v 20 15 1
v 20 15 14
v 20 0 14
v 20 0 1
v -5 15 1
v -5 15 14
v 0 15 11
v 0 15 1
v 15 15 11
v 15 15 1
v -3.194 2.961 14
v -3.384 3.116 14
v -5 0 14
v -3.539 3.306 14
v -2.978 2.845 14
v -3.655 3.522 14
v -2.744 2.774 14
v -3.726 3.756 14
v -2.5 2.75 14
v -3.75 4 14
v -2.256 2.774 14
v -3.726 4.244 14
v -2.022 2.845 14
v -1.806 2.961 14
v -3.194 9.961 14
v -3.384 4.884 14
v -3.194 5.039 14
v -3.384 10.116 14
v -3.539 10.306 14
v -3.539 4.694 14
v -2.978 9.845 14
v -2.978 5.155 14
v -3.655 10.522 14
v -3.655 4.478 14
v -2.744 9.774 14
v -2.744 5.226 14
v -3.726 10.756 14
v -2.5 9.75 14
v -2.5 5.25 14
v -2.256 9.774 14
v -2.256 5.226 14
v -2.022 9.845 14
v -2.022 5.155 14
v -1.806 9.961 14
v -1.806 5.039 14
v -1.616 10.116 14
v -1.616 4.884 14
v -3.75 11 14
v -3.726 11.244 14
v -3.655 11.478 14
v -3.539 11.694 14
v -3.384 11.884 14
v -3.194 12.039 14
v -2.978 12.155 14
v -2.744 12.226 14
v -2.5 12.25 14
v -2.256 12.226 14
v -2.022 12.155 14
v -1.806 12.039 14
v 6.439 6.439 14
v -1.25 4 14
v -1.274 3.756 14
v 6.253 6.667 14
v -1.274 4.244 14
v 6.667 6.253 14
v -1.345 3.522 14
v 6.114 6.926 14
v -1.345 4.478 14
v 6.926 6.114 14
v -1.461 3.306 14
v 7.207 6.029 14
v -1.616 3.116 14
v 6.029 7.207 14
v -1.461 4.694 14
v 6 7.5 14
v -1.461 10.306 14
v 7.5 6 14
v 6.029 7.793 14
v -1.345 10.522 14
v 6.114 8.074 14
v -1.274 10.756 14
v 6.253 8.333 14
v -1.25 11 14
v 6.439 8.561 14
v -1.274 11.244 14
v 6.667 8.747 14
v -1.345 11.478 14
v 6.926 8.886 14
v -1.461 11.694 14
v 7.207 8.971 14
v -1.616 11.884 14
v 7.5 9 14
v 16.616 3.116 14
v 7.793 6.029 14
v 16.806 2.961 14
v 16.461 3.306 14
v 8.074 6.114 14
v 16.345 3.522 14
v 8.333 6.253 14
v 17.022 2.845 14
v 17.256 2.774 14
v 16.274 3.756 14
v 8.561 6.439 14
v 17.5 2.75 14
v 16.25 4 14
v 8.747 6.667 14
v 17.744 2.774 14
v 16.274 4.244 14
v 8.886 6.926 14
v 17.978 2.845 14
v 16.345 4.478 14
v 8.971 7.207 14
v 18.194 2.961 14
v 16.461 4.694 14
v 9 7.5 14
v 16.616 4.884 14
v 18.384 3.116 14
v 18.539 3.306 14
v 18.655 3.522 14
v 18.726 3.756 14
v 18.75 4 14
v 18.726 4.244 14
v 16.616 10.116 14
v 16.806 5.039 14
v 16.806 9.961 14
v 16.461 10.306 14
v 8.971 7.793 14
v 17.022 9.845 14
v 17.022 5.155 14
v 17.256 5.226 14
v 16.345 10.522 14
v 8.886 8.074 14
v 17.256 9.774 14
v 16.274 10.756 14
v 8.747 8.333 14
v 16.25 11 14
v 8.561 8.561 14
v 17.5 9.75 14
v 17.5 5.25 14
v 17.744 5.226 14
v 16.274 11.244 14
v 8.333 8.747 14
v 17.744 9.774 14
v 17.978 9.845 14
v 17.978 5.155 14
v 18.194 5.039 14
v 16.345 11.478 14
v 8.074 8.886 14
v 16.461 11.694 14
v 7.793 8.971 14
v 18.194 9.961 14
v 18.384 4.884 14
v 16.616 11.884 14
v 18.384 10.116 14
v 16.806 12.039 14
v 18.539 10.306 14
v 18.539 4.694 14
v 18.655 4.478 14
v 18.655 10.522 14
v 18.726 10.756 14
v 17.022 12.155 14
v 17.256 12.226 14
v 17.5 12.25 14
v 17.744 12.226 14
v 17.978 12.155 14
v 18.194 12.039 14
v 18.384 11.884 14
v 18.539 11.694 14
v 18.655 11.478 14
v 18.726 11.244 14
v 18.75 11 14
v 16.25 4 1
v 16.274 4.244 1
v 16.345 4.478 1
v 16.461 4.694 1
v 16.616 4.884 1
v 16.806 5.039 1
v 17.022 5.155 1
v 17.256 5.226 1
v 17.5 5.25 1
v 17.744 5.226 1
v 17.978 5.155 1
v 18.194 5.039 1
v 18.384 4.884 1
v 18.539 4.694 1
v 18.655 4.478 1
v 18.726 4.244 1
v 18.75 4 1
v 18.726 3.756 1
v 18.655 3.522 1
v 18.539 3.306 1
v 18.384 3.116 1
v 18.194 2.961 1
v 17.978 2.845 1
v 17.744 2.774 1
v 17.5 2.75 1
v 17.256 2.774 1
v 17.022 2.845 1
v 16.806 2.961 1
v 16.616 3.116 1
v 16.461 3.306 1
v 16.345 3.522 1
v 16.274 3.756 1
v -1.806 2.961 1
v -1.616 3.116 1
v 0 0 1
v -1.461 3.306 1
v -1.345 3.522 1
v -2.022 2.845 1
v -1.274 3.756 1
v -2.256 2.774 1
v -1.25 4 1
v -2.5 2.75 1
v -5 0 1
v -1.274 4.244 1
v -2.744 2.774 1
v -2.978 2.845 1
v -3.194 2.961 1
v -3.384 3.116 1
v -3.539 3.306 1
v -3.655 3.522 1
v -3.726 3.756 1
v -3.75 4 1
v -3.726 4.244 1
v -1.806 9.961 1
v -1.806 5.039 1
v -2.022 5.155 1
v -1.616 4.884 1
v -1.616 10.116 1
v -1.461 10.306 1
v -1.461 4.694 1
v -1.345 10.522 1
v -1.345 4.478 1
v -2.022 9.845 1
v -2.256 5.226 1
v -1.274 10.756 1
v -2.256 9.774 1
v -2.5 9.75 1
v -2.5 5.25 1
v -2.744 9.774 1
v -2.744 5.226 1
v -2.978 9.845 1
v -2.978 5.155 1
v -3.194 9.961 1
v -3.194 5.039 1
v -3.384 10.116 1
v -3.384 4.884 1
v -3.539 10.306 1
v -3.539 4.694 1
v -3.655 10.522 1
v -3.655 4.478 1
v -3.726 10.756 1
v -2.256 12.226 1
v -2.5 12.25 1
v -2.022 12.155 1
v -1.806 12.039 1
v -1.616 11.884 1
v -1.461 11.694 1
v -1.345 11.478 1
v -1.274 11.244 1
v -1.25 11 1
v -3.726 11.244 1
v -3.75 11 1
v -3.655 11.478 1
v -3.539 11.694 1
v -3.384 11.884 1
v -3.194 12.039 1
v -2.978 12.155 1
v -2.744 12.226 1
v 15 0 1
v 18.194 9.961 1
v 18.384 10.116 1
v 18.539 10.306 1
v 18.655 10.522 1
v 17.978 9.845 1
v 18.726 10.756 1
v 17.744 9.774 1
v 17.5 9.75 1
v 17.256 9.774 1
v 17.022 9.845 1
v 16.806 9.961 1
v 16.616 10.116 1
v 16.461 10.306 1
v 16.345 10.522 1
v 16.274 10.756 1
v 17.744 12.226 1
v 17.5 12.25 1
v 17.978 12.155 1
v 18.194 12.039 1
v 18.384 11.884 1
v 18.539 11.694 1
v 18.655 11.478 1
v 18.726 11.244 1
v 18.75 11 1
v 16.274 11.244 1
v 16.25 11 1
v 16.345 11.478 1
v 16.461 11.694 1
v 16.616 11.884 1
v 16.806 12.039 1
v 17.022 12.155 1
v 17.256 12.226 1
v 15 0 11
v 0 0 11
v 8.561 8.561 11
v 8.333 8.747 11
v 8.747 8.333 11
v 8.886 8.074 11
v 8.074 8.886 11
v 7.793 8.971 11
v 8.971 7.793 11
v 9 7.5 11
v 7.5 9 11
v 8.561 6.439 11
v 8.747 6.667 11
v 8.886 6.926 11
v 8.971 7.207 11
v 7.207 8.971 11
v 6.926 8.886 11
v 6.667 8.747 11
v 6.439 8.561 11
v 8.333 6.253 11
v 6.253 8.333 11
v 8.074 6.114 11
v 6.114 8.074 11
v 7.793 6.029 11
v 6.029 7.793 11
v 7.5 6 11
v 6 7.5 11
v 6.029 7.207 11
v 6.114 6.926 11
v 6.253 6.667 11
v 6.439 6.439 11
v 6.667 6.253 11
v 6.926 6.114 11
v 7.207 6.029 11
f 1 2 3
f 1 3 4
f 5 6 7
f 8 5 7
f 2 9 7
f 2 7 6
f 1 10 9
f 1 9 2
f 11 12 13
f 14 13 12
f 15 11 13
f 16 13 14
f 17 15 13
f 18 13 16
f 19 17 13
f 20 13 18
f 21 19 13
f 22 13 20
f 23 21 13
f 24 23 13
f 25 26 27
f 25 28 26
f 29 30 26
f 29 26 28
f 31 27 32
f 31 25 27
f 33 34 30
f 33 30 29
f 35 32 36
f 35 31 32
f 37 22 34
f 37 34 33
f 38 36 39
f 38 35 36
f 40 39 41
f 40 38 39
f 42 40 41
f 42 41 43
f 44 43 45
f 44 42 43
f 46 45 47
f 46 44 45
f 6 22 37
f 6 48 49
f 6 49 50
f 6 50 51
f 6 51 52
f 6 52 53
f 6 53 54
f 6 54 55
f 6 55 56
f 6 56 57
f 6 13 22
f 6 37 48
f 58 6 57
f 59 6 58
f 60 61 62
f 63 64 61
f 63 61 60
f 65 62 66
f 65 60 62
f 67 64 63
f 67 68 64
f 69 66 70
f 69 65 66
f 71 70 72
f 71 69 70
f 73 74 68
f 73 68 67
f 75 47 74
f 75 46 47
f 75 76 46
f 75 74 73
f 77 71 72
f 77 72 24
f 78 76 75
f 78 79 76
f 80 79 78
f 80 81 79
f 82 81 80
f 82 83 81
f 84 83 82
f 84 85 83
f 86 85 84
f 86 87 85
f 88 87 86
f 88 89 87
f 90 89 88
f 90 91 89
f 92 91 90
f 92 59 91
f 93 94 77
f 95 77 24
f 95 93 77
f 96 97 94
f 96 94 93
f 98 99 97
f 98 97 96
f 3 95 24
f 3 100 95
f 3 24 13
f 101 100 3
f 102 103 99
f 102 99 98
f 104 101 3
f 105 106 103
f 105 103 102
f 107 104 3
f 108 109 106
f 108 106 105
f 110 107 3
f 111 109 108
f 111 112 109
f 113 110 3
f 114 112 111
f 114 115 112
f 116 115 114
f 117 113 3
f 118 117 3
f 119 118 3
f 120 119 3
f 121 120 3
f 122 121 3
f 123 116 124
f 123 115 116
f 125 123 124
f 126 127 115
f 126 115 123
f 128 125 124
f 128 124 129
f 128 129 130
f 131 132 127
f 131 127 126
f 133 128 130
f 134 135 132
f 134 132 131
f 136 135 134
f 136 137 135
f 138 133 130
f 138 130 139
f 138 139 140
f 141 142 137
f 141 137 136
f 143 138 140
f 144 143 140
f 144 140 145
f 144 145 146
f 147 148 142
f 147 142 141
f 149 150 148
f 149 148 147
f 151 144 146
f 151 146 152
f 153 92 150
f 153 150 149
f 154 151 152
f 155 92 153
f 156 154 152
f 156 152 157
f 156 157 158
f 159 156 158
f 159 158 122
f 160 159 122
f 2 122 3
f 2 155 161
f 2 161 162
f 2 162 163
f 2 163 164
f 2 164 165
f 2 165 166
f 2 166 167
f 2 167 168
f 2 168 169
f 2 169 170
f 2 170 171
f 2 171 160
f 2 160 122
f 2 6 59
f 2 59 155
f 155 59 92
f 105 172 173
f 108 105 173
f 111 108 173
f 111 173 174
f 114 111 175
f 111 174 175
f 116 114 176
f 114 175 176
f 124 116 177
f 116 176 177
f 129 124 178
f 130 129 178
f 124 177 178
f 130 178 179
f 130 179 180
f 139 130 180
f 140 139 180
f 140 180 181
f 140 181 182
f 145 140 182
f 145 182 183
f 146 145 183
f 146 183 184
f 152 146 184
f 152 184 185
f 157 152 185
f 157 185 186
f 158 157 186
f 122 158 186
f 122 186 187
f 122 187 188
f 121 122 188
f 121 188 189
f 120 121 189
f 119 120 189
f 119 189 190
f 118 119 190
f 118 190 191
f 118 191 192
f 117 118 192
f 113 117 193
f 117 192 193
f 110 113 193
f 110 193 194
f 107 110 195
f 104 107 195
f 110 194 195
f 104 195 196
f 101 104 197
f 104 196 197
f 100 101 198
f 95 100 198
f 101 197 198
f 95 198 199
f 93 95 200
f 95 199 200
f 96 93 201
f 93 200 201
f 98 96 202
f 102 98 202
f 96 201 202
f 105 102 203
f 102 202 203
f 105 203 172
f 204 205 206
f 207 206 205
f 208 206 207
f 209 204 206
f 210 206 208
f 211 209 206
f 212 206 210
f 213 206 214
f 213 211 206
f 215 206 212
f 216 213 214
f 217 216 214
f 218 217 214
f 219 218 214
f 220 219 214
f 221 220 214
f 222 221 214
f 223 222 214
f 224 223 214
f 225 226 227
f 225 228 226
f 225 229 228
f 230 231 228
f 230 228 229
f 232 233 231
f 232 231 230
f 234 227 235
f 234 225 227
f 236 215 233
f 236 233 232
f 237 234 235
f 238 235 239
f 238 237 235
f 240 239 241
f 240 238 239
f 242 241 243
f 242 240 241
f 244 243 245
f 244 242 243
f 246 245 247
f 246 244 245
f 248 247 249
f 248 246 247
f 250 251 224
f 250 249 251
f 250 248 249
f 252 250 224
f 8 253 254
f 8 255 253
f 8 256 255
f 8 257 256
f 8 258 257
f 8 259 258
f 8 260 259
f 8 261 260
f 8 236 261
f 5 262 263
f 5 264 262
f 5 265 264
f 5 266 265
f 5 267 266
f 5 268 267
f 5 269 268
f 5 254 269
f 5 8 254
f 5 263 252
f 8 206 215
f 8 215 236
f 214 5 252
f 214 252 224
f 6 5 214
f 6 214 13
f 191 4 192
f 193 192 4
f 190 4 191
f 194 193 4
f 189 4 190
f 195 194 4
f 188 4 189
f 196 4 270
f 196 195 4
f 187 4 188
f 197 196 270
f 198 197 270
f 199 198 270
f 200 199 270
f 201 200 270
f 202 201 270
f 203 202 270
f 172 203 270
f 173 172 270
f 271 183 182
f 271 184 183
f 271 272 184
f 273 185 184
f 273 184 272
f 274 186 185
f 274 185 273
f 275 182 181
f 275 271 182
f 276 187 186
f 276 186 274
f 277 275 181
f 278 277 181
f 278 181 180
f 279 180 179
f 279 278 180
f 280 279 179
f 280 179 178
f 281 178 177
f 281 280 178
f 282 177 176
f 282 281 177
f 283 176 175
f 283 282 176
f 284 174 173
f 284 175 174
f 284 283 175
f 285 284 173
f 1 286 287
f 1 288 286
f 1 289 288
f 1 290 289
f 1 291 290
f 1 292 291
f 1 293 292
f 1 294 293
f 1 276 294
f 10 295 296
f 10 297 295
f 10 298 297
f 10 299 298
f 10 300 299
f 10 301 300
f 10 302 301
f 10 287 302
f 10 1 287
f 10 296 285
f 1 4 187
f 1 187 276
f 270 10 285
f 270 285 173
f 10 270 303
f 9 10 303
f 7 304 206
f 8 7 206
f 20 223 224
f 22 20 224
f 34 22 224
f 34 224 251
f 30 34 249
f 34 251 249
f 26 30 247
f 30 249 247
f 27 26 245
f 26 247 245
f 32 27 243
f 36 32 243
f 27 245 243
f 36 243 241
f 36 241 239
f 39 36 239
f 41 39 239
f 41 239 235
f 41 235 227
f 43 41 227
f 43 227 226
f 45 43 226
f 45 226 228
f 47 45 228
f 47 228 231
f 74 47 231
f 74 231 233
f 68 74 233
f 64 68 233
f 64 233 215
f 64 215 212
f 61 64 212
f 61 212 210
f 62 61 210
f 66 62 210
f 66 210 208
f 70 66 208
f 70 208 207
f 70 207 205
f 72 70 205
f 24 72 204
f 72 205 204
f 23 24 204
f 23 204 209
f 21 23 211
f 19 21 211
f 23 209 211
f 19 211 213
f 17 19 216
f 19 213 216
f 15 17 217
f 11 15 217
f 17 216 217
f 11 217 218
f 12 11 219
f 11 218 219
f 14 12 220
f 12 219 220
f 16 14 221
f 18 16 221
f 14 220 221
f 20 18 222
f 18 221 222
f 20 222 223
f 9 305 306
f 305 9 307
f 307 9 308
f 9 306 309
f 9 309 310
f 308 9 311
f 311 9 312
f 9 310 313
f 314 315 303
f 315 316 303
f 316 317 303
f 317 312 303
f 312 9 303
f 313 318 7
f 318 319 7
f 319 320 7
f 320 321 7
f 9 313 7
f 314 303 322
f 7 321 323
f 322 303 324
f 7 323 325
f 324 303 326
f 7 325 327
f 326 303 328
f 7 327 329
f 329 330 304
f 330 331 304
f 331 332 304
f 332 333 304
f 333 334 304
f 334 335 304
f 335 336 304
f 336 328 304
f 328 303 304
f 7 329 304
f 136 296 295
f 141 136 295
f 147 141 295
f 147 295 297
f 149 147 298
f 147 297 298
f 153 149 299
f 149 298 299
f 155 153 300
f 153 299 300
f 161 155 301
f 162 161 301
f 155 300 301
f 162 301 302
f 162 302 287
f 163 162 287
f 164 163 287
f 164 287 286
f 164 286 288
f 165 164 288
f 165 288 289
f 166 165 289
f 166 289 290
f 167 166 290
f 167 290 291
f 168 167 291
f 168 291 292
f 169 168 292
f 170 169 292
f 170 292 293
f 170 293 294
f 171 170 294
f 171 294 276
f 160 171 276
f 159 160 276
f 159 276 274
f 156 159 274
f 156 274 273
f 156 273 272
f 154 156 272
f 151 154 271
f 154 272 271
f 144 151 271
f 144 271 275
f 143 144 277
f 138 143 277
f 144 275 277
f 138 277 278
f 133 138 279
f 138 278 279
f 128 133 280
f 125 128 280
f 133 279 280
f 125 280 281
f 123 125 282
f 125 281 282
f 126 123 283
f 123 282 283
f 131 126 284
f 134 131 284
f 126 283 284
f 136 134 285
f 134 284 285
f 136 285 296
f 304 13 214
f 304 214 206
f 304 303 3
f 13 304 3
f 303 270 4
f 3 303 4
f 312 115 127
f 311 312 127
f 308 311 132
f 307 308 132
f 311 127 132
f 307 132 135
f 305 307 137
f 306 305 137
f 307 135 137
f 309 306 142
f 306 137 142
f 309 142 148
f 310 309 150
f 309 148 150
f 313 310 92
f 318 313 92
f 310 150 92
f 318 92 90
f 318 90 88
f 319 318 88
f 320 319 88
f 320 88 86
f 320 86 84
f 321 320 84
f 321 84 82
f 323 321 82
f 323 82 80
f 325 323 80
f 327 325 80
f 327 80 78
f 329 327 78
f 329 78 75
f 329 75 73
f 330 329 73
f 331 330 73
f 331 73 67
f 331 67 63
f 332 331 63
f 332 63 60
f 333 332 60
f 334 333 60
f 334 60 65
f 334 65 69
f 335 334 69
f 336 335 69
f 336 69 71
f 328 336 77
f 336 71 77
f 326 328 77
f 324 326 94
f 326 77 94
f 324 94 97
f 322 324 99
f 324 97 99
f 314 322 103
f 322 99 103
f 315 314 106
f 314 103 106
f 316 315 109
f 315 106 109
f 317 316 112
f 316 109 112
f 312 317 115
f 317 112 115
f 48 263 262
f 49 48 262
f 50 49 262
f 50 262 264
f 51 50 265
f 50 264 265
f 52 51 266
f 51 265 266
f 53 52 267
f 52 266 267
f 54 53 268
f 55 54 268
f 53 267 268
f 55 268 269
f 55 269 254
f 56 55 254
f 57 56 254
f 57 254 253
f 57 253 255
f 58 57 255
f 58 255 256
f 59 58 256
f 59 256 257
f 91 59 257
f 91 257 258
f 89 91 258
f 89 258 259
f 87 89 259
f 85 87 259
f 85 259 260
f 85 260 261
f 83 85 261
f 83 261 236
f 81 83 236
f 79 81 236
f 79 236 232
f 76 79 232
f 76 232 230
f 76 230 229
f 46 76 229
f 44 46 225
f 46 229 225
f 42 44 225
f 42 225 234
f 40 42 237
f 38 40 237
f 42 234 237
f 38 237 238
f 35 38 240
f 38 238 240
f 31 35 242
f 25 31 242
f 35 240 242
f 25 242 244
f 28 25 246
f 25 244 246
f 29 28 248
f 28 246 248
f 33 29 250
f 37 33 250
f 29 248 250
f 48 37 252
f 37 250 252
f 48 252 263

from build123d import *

# Parameters (mm, degrees)
EXTRUDE_1_DEPTH     = 15
SKETCH_2_R          = 1.25
CUT_EXTRUDE_1_DEPTH = 30.154759474
SKETCH_3_R          = 1.25
CUT_EXTRUDE_2_DEPTH = 30.154759474
SKETCH_4_R          = 1.5
CUT_EXTRUDE_3_DEPTH = 18
SKETCH_5_W          = 25
SKETCH_5_H          = 15
CUT_EXTRUDE_4_DEPTH = 1
SKETCH_6_W          = 25
SKETCH_6_H          = 15
CUT_EXTRUDE_5_DEPTH = 1


with BuildPart() as part:
    # 草图1 → 凸台-拉伸1 (new body)
    with BuildSketch(Plane(origin=(0, 0, 0), x_dir=(1, 0, 0), z_dir=(0, 1, 0))):
        Polygon((0, 0), (-5, 0), (-5, -15), (20, -15), (20, 0), (15, 0), (15, -11), (0, -11), align=None)
    extrude(amount=EXTRUDE_1_DEPTH)

    # 草图2 → 切除-拉伸1 (cut, through all)
    with BuildSketch(Plane(origin=(0, 0, 0), x_dir=(-1, 0, 0), z_dir=(0, 0, -1))):
        with Locations((-17.5, 4)):
            Circle(SKETCH_2_R)
        with Locations((-17.5, 11)):
            Circle(SKETCH_2_R)
    extrude(amount=-CUT_EXTRUDE_1_DEPTH, mode=Mode.SUBTRACT)

    # 草图3 → 切除-拉伸2 (cut, through all)
    with BuildSketch(Plane(origin=(0, 0, 0), x_dir=(-1, 0, 0), z_dir=(0, 0, -1))):
        with Locations((2.5, 4)):
            Circle(SKETCH_3_R)
        with Locations((2.5, 11)):
            Circle(SKETCH_3_R)
    extrude(amount=-CUT_EXTRUDE_2_DEPTH, mode=Mode.SUBTRACT)

    # 草图4 → 切除-拉伸3 (cut)
    with BuildSketch(Plane.XY.offset(15)):
        with Locations((7.5, 7.5)):
            Circle(SKETCH_4_R)
    extrude(amount=-CUT_EXTRUDE_3_DEPTH, mode=Mode.SUBTRACT)

    # 草图5 → 切除-拉伸4 (cut)
    with BuildSketch(Plane(origin=(0, 0, 0), x_dir=(-1, 0, 0), z_dir=(0, 0, -1))):
        with Locations((-7.5, 7.5)):
            Rectangle(SKETCH_5_W, SKETCH_5_H)
    extrude(amount=-CUT_EXTRUDE_4_DEPTH, mode=Mode.SUBTRACT)

    # 草图6 → 切除-拉伸5 (cut)
    with BuildSketch(Plane.XY.offset(15)):
        with Locations((7.5, 7.5)):
            Rectangle(SKETCH_6_W, SKETCH_6_H)
    extrude(amount=-CUT_EXTRUDE_5_DEPTH, mode=Mode.SUBTRACT)


solid = part.part
